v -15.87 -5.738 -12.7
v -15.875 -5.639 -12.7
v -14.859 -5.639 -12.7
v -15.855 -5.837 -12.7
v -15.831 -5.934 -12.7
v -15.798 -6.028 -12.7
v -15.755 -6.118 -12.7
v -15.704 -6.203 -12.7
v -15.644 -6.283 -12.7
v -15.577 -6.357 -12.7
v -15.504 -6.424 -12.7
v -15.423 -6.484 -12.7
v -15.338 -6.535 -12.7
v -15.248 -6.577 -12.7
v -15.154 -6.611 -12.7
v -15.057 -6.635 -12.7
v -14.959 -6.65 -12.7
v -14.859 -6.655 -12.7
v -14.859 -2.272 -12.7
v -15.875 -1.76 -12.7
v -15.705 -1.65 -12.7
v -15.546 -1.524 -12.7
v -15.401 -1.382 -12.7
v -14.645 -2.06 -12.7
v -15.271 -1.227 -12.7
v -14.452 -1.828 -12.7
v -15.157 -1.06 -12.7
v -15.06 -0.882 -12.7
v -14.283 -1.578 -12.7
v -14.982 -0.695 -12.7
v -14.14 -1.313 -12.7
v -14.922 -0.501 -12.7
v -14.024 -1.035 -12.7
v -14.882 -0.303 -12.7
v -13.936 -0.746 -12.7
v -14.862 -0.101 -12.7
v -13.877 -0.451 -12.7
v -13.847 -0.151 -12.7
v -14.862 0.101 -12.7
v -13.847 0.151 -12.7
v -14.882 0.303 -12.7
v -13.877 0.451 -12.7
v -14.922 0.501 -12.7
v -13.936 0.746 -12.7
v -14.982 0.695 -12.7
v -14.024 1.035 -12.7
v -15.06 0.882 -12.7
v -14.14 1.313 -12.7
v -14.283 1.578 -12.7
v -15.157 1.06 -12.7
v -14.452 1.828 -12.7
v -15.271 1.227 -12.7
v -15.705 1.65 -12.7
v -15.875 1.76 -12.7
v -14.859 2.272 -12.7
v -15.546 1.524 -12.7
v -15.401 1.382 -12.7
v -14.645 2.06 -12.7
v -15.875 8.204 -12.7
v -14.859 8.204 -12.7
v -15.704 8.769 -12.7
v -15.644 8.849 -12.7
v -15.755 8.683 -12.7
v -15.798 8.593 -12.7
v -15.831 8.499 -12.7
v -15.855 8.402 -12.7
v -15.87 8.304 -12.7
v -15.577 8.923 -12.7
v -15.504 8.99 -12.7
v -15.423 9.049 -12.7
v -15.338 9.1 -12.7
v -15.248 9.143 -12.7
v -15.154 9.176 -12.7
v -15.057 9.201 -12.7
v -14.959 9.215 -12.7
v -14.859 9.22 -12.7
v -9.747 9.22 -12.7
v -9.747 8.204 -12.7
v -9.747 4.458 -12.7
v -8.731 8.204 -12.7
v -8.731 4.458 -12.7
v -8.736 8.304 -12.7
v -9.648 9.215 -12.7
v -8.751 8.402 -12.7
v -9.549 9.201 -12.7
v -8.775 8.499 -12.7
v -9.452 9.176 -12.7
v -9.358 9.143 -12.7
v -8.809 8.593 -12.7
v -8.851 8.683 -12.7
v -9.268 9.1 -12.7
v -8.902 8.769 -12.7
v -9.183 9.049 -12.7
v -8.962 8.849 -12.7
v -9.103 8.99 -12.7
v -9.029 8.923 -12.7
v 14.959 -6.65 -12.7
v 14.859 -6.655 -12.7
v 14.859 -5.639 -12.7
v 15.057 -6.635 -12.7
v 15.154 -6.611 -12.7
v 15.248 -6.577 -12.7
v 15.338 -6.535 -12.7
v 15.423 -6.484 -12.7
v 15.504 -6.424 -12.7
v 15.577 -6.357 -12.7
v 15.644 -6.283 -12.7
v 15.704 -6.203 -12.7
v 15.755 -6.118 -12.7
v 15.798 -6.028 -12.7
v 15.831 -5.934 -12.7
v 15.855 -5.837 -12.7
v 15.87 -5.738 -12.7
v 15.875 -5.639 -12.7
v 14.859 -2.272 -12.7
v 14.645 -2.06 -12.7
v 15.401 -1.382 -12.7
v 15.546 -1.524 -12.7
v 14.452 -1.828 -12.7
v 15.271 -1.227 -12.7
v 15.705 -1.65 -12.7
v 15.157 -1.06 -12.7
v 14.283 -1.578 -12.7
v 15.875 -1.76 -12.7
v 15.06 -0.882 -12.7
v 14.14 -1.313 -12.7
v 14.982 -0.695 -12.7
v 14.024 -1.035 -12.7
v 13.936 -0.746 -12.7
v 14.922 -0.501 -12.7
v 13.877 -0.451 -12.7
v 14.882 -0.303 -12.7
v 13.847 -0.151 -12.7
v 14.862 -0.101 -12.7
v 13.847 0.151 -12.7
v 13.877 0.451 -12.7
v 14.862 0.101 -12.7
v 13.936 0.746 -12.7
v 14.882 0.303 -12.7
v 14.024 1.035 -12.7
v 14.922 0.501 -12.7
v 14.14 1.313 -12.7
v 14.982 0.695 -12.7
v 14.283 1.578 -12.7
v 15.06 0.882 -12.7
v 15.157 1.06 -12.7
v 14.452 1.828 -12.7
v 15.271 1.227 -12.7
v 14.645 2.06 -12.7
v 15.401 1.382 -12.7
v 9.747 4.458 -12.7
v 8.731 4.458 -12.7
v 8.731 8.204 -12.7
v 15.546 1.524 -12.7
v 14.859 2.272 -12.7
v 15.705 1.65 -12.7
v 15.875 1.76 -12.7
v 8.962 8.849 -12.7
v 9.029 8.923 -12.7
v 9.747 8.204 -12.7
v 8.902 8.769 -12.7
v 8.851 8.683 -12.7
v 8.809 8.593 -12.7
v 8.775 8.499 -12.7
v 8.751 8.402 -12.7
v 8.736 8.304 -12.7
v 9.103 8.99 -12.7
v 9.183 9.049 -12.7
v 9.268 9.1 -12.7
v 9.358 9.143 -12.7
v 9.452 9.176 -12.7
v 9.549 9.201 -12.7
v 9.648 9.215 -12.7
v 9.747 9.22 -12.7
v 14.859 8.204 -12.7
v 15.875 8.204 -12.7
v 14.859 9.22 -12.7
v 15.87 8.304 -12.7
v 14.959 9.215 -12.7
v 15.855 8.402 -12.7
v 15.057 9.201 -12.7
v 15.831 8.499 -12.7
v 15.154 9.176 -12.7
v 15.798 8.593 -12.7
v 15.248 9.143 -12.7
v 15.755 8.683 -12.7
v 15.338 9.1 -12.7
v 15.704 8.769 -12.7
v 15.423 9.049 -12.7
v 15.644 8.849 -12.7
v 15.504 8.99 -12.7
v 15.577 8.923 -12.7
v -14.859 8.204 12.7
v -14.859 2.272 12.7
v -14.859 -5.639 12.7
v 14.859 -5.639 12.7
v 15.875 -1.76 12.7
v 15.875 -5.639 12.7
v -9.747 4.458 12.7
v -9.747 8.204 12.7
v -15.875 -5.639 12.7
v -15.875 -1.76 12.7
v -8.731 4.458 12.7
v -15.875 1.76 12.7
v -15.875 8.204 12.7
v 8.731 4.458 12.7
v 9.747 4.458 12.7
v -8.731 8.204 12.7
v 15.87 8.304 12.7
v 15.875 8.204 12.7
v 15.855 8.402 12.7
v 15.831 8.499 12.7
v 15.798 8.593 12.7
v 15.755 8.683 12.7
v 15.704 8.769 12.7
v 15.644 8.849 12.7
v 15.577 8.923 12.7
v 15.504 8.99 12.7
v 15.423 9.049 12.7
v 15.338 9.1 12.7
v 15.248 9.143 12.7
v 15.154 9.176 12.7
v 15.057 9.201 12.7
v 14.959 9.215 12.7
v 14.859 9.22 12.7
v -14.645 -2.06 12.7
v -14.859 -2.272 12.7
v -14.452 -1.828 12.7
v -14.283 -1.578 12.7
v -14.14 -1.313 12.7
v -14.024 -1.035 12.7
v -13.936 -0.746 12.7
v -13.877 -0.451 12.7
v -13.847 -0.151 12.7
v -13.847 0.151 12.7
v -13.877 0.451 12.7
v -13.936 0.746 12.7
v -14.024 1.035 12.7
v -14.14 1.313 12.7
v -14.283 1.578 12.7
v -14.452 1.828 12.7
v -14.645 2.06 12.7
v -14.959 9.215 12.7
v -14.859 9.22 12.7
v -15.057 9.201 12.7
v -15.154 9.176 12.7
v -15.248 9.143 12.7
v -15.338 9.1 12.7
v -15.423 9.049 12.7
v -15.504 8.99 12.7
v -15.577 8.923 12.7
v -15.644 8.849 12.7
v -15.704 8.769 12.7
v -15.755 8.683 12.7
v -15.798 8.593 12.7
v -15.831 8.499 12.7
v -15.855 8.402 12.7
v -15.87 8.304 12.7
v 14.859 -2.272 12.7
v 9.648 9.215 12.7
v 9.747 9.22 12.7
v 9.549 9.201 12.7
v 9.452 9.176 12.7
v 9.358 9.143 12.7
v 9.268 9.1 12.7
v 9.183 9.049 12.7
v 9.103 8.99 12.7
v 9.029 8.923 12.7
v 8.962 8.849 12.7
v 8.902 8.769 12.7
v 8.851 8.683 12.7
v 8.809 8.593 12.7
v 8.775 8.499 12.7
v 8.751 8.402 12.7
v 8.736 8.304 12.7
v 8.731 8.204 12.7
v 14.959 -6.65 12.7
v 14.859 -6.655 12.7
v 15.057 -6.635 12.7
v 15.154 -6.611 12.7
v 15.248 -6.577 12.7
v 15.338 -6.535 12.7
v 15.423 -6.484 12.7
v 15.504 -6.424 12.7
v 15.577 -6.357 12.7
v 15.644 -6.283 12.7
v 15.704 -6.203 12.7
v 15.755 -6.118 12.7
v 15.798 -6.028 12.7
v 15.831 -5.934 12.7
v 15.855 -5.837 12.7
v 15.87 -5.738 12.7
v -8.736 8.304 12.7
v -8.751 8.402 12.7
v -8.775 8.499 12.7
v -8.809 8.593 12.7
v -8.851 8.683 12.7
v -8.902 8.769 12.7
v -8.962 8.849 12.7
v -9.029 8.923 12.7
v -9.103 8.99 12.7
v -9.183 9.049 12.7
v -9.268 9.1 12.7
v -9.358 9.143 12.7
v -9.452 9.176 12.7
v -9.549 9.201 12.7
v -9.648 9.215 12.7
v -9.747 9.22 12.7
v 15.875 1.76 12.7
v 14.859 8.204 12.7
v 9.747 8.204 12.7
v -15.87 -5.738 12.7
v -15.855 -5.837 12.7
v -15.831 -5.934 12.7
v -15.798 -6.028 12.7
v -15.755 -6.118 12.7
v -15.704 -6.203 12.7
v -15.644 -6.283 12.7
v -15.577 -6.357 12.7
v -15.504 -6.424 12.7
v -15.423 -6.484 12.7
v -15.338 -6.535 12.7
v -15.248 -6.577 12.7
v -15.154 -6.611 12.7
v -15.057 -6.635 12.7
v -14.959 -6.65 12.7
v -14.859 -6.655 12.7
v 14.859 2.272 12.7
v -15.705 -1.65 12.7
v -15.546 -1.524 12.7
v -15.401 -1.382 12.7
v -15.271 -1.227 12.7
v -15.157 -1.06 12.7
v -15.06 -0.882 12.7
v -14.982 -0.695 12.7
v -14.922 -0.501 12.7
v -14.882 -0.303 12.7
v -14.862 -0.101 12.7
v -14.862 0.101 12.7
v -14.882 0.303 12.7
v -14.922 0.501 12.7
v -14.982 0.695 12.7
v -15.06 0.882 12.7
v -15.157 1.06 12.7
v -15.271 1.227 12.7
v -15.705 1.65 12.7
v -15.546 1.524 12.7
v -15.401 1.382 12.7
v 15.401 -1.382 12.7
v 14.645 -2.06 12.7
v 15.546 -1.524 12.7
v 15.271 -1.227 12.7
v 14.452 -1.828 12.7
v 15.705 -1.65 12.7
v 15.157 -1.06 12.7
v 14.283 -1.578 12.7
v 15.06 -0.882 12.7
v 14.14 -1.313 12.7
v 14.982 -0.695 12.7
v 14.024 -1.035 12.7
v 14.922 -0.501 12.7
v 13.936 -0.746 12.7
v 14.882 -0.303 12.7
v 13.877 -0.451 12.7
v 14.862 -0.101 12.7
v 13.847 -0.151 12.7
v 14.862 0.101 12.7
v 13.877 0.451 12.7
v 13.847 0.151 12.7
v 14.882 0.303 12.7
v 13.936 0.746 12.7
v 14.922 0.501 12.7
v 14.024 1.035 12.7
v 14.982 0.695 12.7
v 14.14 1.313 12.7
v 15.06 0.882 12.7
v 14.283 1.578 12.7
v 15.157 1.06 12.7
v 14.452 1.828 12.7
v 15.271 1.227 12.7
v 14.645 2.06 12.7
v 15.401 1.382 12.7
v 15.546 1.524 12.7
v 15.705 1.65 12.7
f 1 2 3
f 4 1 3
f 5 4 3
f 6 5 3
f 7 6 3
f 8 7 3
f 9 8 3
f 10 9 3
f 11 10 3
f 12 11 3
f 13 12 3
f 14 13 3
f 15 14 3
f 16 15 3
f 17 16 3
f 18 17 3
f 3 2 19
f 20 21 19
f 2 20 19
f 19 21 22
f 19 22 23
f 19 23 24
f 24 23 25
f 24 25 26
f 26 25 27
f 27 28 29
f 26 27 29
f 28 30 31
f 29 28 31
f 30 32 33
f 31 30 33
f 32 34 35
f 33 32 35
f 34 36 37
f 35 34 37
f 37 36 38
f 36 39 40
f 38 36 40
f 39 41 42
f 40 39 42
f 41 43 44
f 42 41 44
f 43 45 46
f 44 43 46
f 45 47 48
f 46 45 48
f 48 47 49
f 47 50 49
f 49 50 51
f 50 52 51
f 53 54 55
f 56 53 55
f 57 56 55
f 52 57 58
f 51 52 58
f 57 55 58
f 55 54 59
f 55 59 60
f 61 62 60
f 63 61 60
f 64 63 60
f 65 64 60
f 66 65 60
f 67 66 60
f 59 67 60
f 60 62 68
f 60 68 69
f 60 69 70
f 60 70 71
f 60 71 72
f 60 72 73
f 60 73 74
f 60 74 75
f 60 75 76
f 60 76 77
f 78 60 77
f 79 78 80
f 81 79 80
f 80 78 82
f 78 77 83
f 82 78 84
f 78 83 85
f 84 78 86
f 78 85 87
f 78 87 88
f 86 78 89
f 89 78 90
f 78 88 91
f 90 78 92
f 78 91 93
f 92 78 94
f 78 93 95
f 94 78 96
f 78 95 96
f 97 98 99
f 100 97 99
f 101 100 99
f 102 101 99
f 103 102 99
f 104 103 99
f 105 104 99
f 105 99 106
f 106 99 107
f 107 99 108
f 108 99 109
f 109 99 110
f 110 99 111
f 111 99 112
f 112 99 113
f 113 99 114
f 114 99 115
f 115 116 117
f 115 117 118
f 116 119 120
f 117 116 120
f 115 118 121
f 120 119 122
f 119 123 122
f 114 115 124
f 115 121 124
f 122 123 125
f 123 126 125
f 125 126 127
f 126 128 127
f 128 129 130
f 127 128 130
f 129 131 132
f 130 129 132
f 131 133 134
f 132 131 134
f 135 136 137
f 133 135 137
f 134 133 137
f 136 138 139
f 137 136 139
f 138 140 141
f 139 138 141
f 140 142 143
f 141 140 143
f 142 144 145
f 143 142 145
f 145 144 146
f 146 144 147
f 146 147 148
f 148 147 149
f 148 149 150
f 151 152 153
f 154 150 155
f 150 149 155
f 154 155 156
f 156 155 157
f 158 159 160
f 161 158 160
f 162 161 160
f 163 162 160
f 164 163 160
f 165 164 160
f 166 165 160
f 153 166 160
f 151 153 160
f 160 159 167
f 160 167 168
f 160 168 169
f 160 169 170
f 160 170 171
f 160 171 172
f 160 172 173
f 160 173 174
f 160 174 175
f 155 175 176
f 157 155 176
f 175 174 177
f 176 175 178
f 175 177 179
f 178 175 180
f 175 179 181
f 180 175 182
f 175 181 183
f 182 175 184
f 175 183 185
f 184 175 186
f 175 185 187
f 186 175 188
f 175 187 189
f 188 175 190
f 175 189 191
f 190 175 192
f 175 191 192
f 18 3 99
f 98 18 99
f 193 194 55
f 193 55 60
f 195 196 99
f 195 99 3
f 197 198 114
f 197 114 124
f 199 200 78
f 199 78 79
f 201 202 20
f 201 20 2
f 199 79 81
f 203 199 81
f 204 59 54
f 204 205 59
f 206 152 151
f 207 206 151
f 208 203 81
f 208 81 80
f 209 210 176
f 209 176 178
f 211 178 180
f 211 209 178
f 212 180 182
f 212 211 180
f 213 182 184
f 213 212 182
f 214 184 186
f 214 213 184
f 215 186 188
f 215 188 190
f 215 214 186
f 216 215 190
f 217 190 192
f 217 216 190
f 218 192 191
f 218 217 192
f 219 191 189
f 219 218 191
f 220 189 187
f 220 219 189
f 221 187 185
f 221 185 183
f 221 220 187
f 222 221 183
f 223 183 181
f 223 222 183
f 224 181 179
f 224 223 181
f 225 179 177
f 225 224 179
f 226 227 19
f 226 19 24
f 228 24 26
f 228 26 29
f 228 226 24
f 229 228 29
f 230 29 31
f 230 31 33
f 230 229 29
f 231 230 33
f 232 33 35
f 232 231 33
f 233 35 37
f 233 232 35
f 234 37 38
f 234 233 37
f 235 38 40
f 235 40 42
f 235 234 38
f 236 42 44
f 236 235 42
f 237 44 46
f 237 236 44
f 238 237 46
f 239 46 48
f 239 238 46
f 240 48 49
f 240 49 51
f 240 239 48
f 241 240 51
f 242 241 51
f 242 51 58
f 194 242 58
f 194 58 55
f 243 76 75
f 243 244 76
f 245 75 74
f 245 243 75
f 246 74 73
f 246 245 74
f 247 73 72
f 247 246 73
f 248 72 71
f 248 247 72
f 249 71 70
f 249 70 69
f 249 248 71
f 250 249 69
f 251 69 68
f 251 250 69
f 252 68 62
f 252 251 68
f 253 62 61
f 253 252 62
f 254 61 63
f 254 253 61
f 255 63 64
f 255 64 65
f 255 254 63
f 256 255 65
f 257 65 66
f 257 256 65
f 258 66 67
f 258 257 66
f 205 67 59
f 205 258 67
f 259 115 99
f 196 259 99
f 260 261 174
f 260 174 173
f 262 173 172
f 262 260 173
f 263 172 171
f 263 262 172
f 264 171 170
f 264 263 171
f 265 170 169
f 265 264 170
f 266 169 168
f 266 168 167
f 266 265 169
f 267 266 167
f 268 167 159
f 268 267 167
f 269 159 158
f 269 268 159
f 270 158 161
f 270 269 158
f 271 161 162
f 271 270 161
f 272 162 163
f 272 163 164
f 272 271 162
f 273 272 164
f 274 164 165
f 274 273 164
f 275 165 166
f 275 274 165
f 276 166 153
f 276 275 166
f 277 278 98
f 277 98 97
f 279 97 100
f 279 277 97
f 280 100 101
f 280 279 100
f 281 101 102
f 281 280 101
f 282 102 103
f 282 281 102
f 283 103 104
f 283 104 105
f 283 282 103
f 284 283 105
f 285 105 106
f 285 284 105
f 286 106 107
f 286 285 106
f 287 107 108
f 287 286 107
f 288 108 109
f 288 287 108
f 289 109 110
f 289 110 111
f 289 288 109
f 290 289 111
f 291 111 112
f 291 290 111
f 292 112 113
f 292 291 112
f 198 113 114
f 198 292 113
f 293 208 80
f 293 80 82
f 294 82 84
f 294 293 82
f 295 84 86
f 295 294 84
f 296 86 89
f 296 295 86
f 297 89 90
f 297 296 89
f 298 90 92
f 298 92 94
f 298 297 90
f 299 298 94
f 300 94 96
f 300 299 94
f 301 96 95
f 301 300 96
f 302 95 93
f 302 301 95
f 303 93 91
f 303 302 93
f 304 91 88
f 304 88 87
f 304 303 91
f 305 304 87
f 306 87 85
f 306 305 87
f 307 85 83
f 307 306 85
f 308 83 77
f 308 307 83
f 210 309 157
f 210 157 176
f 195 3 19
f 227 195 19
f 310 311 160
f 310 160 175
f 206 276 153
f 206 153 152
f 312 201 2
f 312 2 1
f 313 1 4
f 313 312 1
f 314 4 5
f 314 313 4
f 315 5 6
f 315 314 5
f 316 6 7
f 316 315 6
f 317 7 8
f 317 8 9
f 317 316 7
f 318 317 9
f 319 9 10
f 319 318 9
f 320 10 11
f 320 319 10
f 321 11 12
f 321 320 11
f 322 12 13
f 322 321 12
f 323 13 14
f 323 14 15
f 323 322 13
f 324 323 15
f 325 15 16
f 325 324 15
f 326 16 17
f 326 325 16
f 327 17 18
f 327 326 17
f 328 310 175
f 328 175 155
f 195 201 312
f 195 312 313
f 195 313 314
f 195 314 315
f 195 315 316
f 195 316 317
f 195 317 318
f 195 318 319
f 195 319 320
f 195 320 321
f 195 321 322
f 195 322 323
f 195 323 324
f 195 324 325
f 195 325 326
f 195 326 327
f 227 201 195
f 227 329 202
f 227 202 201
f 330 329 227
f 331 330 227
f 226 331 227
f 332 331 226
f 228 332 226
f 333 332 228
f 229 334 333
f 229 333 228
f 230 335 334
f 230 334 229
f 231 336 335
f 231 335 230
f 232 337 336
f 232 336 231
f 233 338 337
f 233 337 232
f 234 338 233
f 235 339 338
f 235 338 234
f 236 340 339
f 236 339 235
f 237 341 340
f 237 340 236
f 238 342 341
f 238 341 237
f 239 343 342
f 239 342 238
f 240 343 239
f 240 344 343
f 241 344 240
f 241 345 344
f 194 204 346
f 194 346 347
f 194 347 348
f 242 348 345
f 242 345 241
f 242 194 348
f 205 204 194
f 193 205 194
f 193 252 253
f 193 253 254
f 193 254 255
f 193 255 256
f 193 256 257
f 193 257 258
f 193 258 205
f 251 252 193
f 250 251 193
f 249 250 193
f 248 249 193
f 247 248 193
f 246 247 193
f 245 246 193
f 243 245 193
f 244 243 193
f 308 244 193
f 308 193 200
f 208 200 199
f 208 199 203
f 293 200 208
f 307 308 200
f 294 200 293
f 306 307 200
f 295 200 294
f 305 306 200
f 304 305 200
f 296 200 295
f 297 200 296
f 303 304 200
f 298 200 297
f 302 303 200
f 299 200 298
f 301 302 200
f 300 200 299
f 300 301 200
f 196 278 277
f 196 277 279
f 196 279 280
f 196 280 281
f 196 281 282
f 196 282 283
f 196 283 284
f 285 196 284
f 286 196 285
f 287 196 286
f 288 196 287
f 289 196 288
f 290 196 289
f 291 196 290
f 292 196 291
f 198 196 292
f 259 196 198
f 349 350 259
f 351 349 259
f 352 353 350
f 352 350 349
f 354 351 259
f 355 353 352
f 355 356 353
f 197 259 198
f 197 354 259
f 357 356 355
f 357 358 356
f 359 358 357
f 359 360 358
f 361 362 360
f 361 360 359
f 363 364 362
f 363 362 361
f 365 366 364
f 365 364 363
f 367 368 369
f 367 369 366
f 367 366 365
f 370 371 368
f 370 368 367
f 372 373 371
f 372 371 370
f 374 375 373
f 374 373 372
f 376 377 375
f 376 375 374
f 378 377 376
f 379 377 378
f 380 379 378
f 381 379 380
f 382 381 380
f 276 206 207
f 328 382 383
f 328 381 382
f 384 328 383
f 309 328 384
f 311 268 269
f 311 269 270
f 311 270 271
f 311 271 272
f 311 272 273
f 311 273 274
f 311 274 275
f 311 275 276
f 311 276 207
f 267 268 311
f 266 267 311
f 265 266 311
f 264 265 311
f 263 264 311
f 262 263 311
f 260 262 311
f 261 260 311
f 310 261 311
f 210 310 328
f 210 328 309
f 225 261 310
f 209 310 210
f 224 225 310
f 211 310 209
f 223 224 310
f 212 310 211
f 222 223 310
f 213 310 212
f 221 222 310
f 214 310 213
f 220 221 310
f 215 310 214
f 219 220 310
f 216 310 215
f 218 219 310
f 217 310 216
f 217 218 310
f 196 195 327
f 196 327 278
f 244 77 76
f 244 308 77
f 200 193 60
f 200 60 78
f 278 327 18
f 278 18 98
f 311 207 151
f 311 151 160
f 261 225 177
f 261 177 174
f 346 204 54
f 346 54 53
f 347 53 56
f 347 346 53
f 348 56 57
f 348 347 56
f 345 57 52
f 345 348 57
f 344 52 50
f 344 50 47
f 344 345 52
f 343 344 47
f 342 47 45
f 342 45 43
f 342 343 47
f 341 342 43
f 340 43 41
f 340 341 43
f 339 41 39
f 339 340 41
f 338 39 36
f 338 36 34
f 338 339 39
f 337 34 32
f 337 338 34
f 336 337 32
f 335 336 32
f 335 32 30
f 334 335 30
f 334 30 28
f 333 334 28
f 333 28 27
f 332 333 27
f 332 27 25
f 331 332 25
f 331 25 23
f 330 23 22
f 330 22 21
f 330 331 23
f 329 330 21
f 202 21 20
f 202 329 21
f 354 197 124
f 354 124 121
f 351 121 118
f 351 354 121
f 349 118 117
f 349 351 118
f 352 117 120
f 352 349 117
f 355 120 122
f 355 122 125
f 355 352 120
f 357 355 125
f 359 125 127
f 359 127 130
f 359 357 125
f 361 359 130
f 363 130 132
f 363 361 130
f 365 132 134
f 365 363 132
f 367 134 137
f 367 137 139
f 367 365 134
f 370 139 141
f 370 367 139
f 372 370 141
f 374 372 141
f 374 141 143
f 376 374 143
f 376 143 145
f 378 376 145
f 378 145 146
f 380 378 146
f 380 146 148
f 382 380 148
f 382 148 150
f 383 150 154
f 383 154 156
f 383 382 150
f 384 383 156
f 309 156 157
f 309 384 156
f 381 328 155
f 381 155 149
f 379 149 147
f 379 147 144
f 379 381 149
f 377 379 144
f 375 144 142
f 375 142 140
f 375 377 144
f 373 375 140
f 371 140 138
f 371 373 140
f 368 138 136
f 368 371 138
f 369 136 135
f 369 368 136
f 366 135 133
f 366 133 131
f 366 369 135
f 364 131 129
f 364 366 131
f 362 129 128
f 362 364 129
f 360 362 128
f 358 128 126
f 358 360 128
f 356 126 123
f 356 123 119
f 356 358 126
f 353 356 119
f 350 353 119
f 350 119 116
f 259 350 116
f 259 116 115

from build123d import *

# Parameters (mm, degrees)
BASE_EXTRUDE_DEPTH = 12.7


with BuildPart() as part:
    # Sketch1 → Base-Extrude (new, symmetric)
    with BuildSketch(Plane.XY):
        with BuildLine():
            Line((-15.875, 8.2042), (-15.875, 1.75976362))
            ThreePointArc((-15.875, 1.75976362), (-14.859, 0), (-15.875, -1.75976362))
            Line((-15.875, -1.75976362), (-15.875, -5.6388))
            ThreePointArc((-15.875, -5.6388), (-15.57742049, -6.35722049), (-14.859, -6.6548))
            Line((-14.859, -6.6548), (14.859, -6.6548))
            ThreePointArc((14.859, -6.6548), (15.57742049, -6.35722049), (15.875, -5.6388))
            Line((15.875, -5.6388), (15.875, -1.75976362))
            ThreePointArc((15.875, -1.75976362), (14.859, 0), (15.875, 1.75976362))
            Line((15.875, 1.75976362), (15.875, 8.2042))
            ThreePointArc((15.875, 8.2042), (15.57742049, 8.92262049), (14.859, 9.2202))
            Line((14.859, 9.2202), (9.74725, 9.2202))
            ThreePointArc((9.74725, 9.2202), (9.02882951, 8.92262049), (8.73125, 8.2042))
            Line((8.73125, 8.2042), (8.73125, 4.4577))
            Line((8.73125, 4.4577), (9.74725, 4.4577))
            Line((9.74725, 4.4577), (9.74725, 8.2042))
            Line((9.74725, 8.2042), (14.859, 8.2042))
            Line((14.859, 8.2042), (14.859, 2.271845065))
            ThreePointArc((14.859, 2.271845065), (13.843, 0), (14.859, -2.271845065))
            Line((14.859, -2.271845065), (14.859, -5.6388))
            Line((14.859, -5.6388), (-14.859, -5.6388))
            Line((-14.859, -5.6388), (-14.859, -2.271845065))
            ThreePointArc((-14.859, -2.271845065), (-13.843, 0), (-14.859, 2.271845065))
            Line((-14.859, 2.271845065), (-14.859, 8.2042))
            Line((-14.859, 8.2042), (-9.74725, 8.2042))
            Line((-9.74725, 8.2042), (-9.74725, 4.4577))
            Line((-9.74725, 4.4577), (-8.73125, 4.4577))
            Line((-8.73125, 4.4577), (-8.73125, 8.2042))
            ThreePointArc((-8.73125, 8.2042), (-9.02882951, 8.92262049), (-9.74725, 9.2202))
            Line((-9.74725, 9.2202), (-14.859, 9.2202))
            ThreePointArc((-14.859, 9.2202), (-15.57742049, 8.92262049), (-15.875, 8.2042))
        make_face()
    extrude(amount=BASE_EXTRUDE_DEPTH, both=True)


solid = part.part
